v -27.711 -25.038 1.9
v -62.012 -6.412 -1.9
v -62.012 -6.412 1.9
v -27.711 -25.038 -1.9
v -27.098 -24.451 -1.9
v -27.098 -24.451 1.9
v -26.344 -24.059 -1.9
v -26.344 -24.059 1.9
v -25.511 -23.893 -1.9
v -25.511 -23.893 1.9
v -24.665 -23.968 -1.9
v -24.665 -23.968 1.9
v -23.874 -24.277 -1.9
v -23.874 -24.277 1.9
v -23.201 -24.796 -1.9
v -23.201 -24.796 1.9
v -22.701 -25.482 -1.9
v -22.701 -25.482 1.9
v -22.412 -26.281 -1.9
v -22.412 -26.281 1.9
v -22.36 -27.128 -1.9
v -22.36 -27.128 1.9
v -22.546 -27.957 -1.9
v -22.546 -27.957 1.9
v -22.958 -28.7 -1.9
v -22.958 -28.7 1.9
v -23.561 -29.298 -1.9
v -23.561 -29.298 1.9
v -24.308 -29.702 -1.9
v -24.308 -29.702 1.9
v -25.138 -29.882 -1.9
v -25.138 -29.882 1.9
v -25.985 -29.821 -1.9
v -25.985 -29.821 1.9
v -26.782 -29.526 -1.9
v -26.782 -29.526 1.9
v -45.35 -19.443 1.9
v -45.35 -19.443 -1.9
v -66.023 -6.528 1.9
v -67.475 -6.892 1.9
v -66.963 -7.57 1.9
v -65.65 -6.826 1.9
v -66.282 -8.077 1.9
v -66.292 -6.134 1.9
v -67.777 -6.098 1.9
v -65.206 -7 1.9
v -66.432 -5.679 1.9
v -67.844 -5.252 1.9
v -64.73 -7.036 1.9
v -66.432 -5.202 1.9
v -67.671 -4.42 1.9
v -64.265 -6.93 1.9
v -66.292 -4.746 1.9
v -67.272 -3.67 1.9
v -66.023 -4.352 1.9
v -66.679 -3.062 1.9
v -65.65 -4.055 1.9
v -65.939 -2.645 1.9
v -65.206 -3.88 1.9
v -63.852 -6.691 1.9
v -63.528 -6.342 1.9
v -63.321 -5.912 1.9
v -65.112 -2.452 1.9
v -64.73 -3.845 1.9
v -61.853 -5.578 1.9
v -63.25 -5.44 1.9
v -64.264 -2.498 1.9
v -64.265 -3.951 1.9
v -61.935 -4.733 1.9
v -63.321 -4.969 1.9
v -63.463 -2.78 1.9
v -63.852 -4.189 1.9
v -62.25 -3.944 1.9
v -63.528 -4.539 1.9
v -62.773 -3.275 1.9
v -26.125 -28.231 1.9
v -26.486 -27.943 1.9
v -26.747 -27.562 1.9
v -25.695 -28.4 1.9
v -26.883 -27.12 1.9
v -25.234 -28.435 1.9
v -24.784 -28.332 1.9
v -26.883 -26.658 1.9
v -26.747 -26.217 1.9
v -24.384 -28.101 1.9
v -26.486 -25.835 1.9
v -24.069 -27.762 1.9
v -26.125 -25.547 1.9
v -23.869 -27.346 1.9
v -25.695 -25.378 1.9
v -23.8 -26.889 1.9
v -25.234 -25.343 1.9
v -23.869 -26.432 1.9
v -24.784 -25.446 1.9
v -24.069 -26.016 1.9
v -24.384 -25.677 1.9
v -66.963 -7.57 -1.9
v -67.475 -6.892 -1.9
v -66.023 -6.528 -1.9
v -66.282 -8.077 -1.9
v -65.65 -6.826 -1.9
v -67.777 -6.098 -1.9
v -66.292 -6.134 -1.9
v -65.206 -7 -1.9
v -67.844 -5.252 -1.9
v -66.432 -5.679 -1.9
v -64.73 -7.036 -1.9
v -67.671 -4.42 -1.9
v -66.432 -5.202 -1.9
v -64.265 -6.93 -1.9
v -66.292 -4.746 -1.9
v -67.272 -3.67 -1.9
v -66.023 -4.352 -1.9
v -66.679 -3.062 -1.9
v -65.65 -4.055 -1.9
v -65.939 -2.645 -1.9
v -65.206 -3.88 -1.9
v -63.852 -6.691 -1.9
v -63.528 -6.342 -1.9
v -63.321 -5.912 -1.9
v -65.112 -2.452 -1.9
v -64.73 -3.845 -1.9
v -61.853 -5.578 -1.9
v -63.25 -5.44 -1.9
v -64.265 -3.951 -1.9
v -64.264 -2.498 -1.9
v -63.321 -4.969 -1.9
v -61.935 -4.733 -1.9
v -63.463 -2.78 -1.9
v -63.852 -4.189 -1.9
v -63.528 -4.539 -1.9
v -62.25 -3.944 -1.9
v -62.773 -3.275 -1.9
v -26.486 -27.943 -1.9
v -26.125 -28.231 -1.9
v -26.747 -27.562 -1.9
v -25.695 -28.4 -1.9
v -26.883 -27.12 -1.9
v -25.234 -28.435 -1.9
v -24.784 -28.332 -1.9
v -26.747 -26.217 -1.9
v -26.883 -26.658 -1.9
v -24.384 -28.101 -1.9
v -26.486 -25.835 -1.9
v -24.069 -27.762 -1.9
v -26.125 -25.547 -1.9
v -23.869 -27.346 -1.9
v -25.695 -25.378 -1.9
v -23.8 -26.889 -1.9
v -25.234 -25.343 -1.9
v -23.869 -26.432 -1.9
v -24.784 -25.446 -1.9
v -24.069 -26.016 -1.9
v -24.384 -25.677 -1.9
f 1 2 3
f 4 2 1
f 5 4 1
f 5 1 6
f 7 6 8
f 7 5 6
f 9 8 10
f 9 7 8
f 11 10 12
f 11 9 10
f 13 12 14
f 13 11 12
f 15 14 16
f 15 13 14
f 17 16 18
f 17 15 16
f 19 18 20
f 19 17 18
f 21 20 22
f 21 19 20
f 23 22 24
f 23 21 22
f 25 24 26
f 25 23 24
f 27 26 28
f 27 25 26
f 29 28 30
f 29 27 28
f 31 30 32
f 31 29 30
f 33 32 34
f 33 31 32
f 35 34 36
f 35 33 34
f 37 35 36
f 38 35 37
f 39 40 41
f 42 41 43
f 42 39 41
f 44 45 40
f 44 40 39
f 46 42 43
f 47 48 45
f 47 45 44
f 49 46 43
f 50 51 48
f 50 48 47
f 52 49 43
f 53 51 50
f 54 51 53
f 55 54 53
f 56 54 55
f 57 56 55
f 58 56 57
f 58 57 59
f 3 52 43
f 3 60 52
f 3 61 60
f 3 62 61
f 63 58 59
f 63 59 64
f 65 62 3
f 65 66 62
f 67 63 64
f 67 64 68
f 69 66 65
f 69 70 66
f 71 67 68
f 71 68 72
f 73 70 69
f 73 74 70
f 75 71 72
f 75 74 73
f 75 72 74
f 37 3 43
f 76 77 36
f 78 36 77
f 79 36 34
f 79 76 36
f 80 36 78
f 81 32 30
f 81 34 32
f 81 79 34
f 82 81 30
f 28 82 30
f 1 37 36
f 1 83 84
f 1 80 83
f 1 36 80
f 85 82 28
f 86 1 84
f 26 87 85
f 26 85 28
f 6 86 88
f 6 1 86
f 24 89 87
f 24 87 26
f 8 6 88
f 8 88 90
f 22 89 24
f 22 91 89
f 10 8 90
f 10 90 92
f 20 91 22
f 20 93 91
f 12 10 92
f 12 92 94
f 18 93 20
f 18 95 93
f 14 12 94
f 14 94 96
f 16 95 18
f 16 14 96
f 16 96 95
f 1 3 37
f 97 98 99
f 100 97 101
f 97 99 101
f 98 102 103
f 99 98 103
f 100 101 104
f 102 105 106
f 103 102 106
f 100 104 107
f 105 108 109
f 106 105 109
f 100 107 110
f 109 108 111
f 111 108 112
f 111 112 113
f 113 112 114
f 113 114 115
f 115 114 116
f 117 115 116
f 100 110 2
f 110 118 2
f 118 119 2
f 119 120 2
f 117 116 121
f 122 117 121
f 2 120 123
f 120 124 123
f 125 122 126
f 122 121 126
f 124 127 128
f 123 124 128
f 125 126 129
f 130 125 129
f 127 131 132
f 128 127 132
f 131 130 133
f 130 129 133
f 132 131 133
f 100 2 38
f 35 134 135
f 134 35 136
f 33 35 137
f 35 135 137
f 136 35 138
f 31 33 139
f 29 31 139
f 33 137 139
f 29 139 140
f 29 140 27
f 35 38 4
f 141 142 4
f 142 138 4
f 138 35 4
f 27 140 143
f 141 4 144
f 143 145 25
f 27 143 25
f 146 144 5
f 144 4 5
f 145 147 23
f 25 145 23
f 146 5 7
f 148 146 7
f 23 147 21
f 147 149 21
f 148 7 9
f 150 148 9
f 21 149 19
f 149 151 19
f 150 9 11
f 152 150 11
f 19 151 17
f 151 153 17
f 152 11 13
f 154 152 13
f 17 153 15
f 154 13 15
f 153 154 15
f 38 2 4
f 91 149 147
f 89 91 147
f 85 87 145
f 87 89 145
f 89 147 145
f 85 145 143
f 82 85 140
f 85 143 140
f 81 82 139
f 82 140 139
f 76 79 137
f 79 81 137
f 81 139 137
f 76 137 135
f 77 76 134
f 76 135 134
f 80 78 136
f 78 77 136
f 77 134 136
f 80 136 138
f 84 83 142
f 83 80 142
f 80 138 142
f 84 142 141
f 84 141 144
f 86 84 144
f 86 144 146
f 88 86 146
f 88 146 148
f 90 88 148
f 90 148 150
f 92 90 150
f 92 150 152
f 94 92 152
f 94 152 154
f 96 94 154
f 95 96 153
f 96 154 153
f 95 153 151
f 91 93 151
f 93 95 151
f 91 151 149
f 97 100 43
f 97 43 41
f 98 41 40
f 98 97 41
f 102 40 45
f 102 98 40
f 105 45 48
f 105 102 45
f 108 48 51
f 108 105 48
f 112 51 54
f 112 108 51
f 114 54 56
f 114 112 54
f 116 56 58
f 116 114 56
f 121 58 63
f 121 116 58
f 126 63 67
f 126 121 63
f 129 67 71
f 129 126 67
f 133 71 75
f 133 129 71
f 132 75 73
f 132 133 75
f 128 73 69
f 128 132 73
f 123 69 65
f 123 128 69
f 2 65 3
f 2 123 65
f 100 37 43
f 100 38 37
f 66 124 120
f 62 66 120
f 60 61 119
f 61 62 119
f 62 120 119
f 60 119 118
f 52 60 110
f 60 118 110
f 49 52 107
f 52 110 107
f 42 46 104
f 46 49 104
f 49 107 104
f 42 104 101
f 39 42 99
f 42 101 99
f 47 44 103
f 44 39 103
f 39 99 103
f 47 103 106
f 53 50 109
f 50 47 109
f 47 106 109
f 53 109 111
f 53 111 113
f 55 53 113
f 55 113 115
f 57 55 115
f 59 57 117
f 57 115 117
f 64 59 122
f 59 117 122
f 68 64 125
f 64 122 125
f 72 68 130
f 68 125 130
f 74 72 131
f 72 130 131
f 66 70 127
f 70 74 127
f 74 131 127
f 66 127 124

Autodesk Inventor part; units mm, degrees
ref_plane "YZ Plane" through (0, 0, 0) normal (1, 0, 0) x (0, 1, 0)
ref_plane "XZ Plane" through (0, 0, 0) normal (0, 1, 0) x (-1, 0, 0)
ref_plane "XY Plane" through (0, 0, 0) normal (0, 0, 1) x (1, 0, 0)
sketch "Sketch1" plane through (0, 0, 0) normal (0, 0, 1) x (1, 0, 0)
  circle A0 centre (-25.35, -26.8891) radius 1.55 projected
  circle A1 centre (-25.35, -26.8891) radius 3
  circle A2 centre (-64.85, -5.4402) radius 1.6 projected
  circle A3 centre (-64.85, -5.4402) radius 3
  line L0 (-26.7816, -29.5255) -> (-66.2816, -8.0766) construction
  line L1 (-23.9184, -24.2527) -> (-63.4184, -2.8038) construction
  line L2 (-26.7816, -29.5255) -> (-45.35, -19.4427)
  line L3 (-62.0119, -6.4124) -> (-62.0119, -6.4124)
  line L4 (-32.35, -16.7754) -> (-65.35, -16.7754)
  line L5 (-32.35, -5.7754) -> (-57.816, -5.7754)
  line L6 (-32.35, -5.7754) -> (-32.35, -16.7754) construction
  line L7 (-32.35, -11.2754) -> (-52.35, -11.2754) construction
  line L8 (-63.35, -10.6613) -> (-63.35, -16.3989) construction
  line L9 (-45.35, -19.4427) -> (-66.2816, -8.0766)
  line L10 (-62.0119, -6.4124) -> (-27.7109, -25.0381)
  point P0 (0, 0)
  point P1 (-47.8172, -11.2754)
  dimension "d0" = 6
  dimension "d1" = 6
  dimension "d10" = 20
  dimension "d11" = 20
  dimension "d19" = 3.5
extrude "Extrusion1" add sketch "Sketch1" along normal mid plane 3.8
properties part number "palanca base_proxima" material "PPS Plastic"
